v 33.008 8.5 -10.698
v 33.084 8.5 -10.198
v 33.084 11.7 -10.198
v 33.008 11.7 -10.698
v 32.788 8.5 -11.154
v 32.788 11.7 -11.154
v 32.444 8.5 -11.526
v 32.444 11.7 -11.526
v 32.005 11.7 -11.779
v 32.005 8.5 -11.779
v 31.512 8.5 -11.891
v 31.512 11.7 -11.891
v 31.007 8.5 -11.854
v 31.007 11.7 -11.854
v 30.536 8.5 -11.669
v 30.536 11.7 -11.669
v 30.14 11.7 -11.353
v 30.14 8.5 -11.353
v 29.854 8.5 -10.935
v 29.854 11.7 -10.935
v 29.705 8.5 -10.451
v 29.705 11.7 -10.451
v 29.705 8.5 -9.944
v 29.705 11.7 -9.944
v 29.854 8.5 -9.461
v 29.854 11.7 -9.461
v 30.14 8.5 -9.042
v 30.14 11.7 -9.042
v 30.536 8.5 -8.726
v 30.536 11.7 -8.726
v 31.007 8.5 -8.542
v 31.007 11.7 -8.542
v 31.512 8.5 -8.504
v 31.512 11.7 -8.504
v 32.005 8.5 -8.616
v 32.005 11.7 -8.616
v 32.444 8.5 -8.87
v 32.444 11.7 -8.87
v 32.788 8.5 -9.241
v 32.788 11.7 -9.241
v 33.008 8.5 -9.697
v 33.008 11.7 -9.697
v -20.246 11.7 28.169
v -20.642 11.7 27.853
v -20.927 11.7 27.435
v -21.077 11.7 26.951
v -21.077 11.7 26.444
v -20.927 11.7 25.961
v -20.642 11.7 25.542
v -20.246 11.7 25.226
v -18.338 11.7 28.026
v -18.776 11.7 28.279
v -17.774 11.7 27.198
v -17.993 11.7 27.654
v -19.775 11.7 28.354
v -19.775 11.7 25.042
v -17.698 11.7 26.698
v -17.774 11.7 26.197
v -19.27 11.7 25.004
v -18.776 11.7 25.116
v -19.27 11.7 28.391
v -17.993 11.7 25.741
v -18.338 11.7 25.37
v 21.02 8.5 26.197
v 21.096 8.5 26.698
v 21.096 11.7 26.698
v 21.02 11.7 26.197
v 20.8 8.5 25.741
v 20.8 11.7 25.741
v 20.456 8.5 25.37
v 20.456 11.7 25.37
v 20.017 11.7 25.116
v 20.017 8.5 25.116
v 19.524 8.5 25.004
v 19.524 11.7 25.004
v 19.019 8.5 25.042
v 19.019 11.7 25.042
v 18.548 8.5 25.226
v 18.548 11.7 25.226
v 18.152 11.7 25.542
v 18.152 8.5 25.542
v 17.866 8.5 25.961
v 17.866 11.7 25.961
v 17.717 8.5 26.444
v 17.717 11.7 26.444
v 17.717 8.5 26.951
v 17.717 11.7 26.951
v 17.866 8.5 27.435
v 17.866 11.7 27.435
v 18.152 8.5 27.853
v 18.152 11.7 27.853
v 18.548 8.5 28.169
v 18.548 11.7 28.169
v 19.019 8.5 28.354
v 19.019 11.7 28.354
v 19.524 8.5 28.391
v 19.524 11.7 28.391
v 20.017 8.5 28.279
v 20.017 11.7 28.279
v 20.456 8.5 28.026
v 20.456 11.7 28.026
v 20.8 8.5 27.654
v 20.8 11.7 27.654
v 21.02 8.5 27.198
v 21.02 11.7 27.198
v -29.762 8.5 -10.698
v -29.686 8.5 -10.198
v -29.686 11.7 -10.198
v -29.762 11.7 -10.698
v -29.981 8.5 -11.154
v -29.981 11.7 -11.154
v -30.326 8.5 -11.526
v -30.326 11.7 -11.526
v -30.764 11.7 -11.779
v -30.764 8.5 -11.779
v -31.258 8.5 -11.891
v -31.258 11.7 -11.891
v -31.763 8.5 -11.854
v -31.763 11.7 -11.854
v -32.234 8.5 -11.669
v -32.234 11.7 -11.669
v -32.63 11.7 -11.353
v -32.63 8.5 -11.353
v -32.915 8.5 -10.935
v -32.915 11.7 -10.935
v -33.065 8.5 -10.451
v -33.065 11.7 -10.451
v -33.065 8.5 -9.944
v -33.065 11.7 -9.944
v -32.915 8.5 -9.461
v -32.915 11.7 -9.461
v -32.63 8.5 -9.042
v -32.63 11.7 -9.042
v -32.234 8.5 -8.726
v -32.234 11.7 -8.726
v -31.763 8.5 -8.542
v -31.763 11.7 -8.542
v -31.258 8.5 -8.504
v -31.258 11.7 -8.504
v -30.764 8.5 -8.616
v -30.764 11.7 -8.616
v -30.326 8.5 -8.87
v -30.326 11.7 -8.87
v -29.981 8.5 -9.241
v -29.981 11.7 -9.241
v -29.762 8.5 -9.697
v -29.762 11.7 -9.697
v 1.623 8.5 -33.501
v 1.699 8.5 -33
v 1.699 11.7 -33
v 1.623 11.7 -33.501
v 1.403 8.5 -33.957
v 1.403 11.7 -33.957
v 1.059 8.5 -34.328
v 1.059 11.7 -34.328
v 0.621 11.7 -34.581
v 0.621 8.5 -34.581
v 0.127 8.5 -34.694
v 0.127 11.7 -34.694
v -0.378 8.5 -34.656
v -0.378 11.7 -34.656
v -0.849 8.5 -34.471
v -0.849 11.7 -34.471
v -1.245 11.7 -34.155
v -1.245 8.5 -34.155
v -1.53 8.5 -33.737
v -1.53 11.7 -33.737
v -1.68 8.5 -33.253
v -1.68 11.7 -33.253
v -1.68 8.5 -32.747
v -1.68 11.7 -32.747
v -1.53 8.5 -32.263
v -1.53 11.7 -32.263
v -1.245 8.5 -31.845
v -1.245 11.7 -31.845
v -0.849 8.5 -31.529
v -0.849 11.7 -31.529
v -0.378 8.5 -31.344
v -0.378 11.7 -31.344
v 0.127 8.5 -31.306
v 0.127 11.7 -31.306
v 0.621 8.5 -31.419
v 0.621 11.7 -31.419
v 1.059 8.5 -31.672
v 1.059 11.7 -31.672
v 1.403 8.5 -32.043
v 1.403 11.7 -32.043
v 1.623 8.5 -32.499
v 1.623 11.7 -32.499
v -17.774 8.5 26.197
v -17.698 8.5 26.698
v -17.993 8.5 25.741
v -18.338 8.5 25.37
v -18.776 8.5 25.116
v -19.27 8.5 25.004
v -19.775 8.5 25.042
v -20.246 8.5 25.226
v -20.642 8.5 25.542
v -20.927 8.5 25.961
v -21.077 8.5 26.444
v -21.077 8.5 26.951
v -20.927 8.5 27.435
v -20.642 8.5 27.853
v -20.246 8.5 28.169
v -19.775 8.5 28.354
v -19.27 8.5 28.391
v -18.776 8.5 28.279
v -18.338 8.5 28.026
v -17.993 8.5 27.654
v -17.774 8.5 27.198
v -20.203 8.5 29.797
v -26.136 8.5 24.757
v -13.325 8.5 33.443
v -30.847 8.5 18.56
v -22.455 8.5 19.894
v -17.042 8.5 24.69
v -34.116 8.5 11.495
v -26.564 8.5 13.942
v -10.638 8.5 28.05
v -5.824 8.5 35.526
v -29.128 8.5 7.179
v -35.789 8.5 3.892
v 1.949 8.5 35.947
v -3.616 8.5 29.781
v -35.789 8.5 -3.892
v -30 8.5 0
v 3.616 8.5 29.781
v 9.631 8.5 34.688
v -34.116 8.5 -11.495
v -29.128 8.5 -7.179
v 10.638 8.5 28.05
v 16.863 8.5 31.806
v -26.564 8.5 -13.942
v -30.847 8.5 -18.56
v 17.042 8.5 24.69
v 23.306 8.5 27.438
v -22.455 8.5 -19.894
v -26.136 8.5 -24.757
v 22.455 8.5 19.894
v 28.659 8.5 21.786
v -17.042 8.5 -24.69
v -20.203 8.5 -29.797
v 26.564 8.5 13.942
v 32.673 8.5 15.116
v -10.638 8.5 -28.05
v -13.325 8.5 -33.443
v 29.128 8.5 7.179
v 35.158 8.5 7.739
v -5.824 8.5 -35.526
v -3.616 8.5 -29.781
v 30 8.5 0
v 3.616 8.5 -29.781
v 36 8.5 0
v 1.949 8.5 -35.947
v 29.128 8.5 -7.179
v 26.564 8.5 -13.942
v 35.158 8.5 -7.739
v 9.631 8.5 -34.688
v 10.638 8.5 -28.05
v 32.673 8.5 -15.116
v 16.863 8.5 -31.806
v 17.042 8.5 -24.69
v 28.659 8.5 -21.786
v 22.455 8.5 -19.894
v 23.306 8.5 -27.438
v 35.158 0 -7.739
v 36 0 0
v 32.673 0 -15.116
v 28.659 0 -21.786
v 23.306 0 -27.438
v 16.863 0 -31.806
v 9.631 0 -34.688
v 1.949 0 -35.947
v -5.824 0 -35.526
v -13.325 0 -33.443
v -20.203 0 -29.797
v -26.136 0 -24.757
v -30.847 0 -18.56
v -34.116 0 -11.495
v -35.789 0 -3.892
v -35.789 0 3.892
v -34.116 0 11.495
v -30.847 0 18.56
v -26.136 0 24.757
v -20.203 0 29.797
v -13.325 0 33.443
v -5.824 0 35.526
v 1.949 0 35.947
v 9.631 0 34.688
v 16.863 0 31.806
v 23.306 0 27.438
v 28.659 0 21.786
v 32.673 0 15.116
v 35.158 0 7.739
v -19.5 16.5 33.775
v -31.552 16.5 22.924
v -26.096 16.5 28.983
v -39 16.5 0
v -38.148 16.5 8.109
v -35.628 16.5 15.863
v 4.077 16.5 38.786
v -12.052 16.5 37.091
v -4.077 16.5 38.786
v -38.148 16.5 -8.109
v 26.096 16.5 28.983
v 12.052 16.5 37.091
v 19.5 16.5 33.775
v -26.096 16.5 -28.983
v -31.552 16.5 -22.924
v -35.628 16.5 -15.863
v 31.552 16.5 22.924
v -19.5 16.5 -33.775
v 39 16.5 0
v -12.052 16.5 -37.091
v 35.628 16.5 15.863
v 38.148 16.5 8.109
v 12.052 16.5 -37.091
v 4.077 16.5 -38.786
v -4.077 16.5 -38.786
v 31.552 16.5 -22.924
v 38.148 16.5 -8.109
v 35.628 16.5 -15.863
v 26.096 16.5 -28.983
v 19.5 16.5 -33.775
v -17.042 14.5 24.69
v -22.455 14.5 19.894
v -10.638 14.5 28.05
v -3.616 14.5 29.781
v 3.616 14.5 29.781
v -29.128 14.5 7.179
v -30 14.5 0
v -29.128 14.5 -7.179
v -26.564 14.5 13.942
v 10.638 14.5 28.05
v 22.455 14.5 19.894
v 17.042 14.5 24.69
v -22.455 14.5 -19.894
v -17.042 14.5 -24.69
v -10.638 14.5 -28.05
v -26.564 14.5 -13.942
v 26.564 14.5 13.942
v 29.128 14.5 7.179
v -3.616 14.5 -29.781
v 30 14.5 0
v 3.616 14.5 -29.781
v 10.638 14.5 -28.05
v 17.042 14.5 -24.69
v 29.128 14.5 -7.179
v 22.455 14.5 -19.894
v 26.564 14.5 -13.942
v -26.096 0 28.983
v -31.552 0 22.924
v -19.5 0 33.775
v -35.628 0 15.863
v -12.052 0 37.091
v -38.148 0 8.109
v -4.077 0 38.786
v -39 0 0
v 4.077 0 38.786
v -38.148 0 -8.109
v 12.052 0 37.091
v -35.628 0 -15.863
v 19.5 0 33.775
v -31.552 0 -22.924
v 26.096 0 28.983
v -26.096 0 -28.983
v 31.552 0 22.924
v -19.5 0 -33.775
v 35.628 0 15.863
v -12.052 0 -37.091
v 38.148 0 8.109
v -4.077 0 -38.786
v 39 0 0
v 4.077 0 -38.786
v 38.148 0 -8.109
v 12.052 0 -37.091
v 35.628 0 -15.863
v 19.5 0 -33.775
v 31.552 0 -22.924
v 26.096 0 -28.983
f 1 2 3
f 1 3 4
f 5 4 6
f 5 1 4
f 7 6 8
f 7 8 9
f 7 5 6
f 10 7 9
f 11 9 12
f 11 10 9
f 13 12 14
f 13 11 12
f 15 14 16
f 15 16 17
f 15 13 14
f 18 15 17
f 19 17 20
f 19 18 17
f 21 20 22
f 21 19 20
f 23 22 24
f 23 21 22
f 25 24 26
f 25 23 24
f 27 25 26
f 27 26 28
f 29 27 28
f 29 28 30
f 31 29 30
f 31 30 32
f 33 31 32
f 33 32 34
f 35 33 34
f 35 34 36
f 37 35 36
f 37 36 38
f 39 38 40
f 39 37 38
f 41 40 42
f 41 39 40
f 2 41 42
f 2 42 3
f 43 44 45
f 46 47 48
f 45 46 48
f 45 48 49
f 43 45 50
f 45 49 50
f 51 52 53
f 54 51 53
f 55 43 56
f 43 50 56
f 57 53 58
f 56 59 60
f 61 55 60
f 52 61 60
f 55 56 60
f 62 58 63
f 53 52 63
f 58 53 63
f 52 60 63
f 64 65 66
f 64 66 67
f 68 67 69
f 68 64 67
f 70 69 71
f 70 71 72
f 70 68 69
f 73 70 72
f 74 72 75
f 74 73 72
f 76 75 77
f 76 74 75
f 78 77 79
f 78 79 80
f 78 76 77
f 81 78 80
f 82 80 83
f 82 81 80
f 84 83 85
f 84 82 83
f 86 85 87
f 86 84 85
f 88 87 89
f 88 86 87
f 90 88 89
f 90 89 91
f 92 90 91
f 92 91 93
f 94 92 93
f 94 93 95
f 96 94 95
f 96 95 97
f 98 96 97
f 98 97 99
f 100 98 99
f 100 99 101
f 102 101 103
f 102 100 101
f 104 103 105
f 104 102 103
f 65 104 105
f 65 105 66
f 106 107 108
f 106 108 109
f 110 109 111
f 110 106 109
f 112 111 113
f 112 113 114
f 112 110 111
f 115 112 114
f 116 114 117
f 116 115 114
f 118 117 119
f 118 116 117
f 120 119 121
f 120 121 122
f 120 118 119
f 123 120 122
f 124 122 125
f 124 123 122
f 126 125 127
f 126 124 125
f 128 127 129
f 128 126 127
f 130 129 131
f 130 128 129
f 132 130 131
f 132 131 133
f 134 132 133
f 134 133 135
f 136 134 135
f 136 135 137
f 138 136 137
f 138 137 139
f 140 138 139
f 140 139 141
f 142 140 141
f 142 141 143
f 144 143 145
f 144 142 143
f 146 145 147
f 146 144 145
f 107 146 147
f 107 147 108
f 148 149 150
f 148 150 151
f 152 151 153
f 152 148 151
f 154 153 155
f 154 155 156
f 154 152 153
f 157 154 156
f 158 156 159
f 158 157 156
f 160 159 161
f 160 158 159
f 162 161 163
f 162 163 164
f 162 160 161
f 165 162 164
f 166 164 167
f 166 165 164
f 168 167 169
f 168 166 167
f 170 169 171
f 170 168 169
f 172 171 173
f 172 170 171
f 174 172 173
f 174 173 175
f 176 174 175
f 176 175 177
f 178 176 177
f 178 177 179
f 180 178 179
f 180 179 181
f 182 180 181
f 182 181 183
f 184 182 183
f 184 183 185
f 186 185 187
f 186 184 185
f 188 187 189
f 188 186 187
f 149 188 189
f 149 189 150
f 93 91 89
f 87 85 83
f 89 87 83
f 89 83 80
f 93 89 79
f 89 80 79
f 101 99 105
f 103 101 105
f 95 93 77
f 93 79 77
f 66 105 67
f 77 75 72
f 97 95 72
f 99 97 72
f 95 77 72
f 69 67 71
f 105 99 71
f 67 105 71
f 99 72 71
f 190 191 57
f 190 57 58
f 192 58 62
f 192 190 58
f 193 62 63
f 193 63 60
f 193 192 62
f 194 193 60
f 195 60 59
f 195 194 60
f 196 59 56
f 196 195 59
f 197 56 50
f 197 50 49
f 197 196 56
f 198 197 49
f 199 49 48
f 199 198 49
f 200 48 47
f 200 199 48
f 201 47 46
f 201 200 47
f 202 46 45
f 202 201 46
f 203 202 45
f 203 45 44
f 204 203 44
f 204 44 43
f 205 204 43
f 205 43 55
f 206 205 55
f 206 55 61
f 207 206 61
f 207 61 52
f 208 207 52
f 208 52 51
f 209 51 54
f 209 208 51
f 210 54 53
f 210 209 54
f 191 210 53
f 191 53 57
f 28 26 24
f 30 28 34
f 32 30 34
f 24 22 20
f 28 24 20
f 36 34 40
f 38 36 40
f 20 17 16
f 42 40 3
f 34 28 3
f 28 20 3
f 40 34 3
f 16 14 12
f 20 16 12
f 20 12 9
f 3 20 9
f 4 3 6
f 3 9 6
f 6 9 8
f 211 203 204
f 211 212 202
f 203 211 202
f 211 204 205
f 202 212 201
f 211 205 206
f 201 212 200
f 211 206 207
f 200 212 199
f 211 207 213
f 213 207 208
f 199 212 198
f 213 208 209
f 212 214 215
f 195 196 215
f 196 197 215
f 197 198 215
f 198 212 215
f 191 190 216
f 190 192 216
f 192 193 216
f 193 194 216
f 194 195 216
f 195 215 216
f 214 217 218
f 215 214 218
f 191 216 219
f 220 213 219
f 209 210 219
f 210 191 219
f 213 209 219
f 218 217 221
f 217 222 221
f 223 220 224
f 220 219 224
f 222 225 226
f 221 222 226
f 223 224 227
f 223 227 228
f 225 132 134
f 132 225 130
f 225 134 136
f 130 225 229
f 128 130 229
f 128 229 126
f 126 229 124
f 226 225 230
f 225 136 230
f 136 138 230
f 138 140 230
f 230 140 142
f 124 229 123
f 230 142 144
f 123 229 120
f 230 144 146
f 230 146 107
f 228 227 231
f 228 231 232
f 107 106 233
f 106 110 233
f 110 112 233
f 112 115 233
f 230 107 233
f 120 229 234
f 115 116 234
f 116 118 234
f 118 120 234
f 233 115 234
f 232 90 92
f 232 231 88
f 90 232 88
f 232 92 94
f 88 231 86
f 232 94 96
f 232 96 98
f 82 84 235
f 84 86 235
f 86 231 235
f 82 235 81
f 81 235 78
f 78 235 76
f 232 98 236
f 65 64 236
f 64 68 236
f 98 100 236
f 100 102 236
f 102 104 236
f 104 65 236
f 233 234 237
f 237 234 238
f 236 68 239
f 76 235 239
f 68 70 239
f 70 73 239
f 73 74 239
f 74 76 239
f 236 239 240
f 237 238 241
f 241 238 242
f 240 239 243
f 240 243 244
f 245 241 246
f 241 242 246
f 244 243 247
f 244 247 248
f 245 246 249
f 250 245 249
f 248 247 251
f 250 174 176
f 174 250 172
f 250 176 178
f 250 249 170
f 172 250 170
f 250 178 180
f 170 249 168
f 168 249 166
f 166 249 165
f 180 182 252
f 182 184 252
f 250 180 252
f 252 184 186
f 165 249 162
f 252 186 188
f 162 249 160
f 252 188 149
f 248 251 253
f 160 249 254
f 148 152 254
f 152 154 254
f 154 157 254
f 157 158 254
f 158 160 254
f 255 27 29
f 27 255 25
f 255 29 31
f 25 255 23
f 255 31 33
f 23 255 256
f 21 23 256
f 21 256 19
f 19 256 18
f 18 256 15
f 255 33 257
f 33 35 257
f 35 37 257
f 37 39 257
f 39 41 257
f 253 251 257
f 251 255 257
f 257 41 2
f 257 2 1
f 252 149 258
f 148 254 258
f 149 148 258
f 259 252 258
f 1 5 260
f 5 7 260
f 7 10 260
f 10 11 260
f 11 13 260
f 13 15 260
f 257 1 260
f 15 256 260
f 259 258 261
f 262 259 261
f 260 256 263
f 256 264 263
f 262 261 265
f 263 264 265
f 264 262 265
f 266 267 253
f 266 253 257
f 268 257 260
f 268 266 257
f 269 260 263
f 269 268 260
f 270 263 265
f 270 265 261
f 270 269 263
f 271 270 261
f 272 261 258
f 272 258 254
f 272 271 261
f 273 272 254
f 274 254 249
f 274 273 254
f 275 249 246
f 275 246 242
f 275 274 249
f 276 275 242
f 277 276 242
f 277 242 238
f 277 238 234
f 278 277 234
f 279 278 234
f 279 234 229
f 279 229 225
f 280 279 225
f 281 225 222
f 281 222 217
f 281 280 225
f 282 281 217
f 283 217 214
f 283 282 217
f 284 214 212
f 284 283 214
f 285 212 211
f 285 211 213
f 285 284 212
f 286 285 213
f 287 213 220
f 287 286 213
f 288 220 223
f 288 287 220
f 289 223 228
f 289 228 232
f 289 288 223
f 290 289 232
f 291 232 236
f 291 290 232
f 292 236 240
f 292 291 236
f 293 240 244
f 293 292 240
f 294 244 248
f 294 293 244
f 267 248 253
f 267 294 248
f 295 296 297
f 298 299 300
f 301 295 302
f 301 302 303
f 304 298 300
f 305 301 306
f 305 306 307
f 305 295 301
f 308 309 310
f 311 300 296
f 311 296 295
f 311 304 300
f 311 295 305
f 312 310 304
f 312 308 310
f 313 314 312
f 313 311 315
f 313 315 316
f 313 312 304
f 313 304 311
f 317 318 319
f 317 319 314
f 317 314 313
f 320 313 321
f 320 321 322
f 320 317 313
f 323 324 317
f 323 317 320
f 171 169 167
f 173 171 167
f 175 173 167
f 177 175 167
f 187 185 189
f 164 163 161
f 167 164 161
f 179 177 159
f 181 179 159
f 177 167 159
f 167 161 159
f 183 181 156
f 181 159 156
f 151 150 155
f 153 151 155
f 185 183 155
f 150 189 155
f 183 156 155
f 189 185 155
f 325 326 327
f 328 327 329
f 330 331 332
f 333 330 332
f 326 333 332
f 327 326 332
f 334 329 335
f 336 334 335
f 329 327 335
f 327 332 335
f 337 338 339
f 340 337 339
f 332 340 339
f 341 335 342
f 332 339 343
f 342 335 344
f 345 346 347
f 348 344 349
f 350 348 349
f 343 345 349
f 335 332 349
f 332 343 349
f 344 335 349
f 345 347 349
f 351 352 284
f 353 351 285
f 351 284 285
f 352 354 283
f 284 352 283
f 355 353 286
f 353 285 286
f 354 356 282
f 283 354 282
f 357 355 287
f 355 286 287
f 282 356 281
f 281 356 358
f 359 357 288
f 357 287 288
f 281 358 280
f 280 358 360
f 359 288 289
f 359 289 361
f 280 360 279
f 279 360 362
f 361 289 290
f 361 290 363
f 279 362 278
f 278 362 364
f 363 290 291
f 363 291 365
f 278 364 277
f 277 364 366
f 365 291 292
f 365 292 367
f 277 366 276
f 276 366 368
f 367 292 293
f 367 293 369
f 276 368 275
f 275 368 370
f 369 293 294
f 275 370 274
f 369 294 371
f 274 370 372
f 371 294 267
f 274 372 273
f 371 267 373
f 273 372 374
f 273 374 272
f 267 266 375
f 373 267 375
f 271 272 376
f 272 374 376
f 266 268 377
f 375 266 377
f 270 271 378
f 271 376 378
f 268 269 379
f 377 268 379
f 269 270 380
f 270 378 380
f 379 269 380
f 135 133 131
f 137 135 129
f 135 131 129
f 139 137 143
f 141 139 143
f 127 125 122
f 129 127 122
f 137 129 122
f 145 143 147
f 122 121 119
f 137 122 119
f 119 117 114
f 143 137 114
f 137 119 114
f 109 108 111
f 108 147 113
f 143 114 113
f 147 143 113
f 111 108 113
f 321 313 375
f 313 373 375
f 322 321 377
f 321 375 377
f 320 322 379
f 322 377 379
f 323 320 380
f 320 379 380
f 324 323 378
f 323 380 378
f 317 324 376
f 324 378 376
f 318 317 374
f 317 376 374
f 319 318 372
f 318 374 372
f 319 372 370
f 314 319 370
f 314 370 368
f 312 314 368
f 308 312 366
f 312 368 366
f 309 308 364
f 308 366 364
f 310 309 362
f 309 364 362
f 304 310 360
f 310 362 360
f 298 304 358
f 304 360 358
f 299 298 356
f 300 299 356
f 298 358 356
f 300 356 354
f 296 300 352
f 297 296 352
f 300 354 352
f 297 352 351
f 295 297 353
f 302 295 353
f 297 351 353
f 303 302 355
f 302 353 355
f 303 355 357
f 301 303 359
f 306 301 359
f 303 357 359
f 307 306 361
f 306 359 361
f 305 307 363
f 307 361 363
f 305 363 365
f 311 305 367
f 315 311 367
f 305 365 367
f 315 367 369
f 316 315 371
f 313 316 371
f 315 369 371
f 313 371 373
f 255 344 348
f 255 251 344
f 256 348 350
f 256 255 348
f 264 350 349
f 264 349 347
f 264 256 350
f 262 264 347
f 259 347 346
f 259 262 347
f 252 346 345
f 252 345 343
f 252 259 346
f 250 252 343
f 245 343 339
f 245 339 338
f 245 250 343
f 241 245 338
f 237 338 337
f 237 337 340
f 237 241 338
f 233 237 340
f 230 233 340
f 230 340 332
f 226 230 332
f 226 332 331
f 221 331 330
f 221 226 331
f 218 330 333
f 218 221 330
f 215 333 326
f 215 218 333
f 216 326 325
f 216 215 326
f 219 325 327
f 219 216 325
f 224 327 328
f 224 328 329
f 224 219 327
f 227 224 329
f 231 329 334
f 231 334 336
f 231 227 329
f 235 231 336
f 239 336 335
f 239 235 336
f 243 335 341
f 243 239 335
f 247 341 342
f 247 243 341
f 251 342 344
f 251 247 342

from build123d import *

# Parameters (mm, degrees)
SKETCH1_R           = 39
SKETCH1_R_2         = 36
BOSS_EXTRUDE2_DEPTH = 8.5
SKETCH2_R           = 39
SKETCH2_R_2         = 30
SKETCH2_R_3         = 1.698645883
BOSS_EXTRUDE3_DEPTH = 3.2
SKETCH4_R           = 39
SKETCH4_R_2         = 30
BOSS_EXTRUDE6_DEPTH = 2.8
SKETCH11_R          = 39
BOSS_EXTRUDE7_DEPTH = 2


with BuildPart() as part:
    # Sketch1 → Boss-Extrude2 (new body)
    with BuildSketch(Plane(origin=(0, 0, 0), x_dir=(1, 0, 0), z_dir=(0, 1, 0))):
        Circle(SKETCH1_R)
        Circle(SKETCH1_R_2, mode=Mode.SUBTRACT)
    extrude(amount=BOSS_EXTRUDE2_DEPTH)

    # Sketch2 → Boss-Extrude3 (add)
    with BuildSketch(Plane(origin=(0, 8.5, 0), x_dir=(1, 0, 0), z_dir=(0, 1, 0))):
        Circle(SKETCH2_R)
        Circle(SKETCH2_R_2, mode=Mode.SUBTRACT)
        with Locations((0, 33)):
            Circle(SKETCH2_R_3, mode=Mode.SUBTRACT)
        with Locations((31.384865038, 10.197560814)):
            Circle(SKETCH2_R_3, mode=Mode.SUBTRACT)
        with Locations((19.396913326, -26.697560814)):
            Circle(SKETCH2_R_3, mode=Mode.SUBTRACT)
        with Locations((-19.396913326, -26.697560814)):
            Circle(SKETCH2_R_3, mode=Mode.SUBTRACT)
        with Locations((-31.384865038, 10.197560814)):
            Circle(SKETCH2_R_3, mode=Mode.SUBTRACT)
    extrude(amount=BOSS_EXTRUDE3_DEPTH)

    # Sketch4 → Boss-Extrude6 (add)
    with BuildSketch(Plane(origin=(0, 11.7, 0), x_dir=(1, 0, 0), z_dir=(0, 1, 0))):
        Circle(SKETCH4_R)
        Circle(SKETCH4_R_2, mode=Mode.SUBTRACT)
    extrude(amount=BOSS_EXTRUDE6_DEPTH)

    # Sketch11 → Boss-Extrude7 (add)
    with BuildSketch(Plane(origin=(0, 14.5, 0), x_dir=(1, 0, 0), z_dir=(0, 1, 0))):
        Circle(SKETCH11_R)
    extrude(amount=BOSS_EXTRUDE7_DEPTH)


solid = part.part
